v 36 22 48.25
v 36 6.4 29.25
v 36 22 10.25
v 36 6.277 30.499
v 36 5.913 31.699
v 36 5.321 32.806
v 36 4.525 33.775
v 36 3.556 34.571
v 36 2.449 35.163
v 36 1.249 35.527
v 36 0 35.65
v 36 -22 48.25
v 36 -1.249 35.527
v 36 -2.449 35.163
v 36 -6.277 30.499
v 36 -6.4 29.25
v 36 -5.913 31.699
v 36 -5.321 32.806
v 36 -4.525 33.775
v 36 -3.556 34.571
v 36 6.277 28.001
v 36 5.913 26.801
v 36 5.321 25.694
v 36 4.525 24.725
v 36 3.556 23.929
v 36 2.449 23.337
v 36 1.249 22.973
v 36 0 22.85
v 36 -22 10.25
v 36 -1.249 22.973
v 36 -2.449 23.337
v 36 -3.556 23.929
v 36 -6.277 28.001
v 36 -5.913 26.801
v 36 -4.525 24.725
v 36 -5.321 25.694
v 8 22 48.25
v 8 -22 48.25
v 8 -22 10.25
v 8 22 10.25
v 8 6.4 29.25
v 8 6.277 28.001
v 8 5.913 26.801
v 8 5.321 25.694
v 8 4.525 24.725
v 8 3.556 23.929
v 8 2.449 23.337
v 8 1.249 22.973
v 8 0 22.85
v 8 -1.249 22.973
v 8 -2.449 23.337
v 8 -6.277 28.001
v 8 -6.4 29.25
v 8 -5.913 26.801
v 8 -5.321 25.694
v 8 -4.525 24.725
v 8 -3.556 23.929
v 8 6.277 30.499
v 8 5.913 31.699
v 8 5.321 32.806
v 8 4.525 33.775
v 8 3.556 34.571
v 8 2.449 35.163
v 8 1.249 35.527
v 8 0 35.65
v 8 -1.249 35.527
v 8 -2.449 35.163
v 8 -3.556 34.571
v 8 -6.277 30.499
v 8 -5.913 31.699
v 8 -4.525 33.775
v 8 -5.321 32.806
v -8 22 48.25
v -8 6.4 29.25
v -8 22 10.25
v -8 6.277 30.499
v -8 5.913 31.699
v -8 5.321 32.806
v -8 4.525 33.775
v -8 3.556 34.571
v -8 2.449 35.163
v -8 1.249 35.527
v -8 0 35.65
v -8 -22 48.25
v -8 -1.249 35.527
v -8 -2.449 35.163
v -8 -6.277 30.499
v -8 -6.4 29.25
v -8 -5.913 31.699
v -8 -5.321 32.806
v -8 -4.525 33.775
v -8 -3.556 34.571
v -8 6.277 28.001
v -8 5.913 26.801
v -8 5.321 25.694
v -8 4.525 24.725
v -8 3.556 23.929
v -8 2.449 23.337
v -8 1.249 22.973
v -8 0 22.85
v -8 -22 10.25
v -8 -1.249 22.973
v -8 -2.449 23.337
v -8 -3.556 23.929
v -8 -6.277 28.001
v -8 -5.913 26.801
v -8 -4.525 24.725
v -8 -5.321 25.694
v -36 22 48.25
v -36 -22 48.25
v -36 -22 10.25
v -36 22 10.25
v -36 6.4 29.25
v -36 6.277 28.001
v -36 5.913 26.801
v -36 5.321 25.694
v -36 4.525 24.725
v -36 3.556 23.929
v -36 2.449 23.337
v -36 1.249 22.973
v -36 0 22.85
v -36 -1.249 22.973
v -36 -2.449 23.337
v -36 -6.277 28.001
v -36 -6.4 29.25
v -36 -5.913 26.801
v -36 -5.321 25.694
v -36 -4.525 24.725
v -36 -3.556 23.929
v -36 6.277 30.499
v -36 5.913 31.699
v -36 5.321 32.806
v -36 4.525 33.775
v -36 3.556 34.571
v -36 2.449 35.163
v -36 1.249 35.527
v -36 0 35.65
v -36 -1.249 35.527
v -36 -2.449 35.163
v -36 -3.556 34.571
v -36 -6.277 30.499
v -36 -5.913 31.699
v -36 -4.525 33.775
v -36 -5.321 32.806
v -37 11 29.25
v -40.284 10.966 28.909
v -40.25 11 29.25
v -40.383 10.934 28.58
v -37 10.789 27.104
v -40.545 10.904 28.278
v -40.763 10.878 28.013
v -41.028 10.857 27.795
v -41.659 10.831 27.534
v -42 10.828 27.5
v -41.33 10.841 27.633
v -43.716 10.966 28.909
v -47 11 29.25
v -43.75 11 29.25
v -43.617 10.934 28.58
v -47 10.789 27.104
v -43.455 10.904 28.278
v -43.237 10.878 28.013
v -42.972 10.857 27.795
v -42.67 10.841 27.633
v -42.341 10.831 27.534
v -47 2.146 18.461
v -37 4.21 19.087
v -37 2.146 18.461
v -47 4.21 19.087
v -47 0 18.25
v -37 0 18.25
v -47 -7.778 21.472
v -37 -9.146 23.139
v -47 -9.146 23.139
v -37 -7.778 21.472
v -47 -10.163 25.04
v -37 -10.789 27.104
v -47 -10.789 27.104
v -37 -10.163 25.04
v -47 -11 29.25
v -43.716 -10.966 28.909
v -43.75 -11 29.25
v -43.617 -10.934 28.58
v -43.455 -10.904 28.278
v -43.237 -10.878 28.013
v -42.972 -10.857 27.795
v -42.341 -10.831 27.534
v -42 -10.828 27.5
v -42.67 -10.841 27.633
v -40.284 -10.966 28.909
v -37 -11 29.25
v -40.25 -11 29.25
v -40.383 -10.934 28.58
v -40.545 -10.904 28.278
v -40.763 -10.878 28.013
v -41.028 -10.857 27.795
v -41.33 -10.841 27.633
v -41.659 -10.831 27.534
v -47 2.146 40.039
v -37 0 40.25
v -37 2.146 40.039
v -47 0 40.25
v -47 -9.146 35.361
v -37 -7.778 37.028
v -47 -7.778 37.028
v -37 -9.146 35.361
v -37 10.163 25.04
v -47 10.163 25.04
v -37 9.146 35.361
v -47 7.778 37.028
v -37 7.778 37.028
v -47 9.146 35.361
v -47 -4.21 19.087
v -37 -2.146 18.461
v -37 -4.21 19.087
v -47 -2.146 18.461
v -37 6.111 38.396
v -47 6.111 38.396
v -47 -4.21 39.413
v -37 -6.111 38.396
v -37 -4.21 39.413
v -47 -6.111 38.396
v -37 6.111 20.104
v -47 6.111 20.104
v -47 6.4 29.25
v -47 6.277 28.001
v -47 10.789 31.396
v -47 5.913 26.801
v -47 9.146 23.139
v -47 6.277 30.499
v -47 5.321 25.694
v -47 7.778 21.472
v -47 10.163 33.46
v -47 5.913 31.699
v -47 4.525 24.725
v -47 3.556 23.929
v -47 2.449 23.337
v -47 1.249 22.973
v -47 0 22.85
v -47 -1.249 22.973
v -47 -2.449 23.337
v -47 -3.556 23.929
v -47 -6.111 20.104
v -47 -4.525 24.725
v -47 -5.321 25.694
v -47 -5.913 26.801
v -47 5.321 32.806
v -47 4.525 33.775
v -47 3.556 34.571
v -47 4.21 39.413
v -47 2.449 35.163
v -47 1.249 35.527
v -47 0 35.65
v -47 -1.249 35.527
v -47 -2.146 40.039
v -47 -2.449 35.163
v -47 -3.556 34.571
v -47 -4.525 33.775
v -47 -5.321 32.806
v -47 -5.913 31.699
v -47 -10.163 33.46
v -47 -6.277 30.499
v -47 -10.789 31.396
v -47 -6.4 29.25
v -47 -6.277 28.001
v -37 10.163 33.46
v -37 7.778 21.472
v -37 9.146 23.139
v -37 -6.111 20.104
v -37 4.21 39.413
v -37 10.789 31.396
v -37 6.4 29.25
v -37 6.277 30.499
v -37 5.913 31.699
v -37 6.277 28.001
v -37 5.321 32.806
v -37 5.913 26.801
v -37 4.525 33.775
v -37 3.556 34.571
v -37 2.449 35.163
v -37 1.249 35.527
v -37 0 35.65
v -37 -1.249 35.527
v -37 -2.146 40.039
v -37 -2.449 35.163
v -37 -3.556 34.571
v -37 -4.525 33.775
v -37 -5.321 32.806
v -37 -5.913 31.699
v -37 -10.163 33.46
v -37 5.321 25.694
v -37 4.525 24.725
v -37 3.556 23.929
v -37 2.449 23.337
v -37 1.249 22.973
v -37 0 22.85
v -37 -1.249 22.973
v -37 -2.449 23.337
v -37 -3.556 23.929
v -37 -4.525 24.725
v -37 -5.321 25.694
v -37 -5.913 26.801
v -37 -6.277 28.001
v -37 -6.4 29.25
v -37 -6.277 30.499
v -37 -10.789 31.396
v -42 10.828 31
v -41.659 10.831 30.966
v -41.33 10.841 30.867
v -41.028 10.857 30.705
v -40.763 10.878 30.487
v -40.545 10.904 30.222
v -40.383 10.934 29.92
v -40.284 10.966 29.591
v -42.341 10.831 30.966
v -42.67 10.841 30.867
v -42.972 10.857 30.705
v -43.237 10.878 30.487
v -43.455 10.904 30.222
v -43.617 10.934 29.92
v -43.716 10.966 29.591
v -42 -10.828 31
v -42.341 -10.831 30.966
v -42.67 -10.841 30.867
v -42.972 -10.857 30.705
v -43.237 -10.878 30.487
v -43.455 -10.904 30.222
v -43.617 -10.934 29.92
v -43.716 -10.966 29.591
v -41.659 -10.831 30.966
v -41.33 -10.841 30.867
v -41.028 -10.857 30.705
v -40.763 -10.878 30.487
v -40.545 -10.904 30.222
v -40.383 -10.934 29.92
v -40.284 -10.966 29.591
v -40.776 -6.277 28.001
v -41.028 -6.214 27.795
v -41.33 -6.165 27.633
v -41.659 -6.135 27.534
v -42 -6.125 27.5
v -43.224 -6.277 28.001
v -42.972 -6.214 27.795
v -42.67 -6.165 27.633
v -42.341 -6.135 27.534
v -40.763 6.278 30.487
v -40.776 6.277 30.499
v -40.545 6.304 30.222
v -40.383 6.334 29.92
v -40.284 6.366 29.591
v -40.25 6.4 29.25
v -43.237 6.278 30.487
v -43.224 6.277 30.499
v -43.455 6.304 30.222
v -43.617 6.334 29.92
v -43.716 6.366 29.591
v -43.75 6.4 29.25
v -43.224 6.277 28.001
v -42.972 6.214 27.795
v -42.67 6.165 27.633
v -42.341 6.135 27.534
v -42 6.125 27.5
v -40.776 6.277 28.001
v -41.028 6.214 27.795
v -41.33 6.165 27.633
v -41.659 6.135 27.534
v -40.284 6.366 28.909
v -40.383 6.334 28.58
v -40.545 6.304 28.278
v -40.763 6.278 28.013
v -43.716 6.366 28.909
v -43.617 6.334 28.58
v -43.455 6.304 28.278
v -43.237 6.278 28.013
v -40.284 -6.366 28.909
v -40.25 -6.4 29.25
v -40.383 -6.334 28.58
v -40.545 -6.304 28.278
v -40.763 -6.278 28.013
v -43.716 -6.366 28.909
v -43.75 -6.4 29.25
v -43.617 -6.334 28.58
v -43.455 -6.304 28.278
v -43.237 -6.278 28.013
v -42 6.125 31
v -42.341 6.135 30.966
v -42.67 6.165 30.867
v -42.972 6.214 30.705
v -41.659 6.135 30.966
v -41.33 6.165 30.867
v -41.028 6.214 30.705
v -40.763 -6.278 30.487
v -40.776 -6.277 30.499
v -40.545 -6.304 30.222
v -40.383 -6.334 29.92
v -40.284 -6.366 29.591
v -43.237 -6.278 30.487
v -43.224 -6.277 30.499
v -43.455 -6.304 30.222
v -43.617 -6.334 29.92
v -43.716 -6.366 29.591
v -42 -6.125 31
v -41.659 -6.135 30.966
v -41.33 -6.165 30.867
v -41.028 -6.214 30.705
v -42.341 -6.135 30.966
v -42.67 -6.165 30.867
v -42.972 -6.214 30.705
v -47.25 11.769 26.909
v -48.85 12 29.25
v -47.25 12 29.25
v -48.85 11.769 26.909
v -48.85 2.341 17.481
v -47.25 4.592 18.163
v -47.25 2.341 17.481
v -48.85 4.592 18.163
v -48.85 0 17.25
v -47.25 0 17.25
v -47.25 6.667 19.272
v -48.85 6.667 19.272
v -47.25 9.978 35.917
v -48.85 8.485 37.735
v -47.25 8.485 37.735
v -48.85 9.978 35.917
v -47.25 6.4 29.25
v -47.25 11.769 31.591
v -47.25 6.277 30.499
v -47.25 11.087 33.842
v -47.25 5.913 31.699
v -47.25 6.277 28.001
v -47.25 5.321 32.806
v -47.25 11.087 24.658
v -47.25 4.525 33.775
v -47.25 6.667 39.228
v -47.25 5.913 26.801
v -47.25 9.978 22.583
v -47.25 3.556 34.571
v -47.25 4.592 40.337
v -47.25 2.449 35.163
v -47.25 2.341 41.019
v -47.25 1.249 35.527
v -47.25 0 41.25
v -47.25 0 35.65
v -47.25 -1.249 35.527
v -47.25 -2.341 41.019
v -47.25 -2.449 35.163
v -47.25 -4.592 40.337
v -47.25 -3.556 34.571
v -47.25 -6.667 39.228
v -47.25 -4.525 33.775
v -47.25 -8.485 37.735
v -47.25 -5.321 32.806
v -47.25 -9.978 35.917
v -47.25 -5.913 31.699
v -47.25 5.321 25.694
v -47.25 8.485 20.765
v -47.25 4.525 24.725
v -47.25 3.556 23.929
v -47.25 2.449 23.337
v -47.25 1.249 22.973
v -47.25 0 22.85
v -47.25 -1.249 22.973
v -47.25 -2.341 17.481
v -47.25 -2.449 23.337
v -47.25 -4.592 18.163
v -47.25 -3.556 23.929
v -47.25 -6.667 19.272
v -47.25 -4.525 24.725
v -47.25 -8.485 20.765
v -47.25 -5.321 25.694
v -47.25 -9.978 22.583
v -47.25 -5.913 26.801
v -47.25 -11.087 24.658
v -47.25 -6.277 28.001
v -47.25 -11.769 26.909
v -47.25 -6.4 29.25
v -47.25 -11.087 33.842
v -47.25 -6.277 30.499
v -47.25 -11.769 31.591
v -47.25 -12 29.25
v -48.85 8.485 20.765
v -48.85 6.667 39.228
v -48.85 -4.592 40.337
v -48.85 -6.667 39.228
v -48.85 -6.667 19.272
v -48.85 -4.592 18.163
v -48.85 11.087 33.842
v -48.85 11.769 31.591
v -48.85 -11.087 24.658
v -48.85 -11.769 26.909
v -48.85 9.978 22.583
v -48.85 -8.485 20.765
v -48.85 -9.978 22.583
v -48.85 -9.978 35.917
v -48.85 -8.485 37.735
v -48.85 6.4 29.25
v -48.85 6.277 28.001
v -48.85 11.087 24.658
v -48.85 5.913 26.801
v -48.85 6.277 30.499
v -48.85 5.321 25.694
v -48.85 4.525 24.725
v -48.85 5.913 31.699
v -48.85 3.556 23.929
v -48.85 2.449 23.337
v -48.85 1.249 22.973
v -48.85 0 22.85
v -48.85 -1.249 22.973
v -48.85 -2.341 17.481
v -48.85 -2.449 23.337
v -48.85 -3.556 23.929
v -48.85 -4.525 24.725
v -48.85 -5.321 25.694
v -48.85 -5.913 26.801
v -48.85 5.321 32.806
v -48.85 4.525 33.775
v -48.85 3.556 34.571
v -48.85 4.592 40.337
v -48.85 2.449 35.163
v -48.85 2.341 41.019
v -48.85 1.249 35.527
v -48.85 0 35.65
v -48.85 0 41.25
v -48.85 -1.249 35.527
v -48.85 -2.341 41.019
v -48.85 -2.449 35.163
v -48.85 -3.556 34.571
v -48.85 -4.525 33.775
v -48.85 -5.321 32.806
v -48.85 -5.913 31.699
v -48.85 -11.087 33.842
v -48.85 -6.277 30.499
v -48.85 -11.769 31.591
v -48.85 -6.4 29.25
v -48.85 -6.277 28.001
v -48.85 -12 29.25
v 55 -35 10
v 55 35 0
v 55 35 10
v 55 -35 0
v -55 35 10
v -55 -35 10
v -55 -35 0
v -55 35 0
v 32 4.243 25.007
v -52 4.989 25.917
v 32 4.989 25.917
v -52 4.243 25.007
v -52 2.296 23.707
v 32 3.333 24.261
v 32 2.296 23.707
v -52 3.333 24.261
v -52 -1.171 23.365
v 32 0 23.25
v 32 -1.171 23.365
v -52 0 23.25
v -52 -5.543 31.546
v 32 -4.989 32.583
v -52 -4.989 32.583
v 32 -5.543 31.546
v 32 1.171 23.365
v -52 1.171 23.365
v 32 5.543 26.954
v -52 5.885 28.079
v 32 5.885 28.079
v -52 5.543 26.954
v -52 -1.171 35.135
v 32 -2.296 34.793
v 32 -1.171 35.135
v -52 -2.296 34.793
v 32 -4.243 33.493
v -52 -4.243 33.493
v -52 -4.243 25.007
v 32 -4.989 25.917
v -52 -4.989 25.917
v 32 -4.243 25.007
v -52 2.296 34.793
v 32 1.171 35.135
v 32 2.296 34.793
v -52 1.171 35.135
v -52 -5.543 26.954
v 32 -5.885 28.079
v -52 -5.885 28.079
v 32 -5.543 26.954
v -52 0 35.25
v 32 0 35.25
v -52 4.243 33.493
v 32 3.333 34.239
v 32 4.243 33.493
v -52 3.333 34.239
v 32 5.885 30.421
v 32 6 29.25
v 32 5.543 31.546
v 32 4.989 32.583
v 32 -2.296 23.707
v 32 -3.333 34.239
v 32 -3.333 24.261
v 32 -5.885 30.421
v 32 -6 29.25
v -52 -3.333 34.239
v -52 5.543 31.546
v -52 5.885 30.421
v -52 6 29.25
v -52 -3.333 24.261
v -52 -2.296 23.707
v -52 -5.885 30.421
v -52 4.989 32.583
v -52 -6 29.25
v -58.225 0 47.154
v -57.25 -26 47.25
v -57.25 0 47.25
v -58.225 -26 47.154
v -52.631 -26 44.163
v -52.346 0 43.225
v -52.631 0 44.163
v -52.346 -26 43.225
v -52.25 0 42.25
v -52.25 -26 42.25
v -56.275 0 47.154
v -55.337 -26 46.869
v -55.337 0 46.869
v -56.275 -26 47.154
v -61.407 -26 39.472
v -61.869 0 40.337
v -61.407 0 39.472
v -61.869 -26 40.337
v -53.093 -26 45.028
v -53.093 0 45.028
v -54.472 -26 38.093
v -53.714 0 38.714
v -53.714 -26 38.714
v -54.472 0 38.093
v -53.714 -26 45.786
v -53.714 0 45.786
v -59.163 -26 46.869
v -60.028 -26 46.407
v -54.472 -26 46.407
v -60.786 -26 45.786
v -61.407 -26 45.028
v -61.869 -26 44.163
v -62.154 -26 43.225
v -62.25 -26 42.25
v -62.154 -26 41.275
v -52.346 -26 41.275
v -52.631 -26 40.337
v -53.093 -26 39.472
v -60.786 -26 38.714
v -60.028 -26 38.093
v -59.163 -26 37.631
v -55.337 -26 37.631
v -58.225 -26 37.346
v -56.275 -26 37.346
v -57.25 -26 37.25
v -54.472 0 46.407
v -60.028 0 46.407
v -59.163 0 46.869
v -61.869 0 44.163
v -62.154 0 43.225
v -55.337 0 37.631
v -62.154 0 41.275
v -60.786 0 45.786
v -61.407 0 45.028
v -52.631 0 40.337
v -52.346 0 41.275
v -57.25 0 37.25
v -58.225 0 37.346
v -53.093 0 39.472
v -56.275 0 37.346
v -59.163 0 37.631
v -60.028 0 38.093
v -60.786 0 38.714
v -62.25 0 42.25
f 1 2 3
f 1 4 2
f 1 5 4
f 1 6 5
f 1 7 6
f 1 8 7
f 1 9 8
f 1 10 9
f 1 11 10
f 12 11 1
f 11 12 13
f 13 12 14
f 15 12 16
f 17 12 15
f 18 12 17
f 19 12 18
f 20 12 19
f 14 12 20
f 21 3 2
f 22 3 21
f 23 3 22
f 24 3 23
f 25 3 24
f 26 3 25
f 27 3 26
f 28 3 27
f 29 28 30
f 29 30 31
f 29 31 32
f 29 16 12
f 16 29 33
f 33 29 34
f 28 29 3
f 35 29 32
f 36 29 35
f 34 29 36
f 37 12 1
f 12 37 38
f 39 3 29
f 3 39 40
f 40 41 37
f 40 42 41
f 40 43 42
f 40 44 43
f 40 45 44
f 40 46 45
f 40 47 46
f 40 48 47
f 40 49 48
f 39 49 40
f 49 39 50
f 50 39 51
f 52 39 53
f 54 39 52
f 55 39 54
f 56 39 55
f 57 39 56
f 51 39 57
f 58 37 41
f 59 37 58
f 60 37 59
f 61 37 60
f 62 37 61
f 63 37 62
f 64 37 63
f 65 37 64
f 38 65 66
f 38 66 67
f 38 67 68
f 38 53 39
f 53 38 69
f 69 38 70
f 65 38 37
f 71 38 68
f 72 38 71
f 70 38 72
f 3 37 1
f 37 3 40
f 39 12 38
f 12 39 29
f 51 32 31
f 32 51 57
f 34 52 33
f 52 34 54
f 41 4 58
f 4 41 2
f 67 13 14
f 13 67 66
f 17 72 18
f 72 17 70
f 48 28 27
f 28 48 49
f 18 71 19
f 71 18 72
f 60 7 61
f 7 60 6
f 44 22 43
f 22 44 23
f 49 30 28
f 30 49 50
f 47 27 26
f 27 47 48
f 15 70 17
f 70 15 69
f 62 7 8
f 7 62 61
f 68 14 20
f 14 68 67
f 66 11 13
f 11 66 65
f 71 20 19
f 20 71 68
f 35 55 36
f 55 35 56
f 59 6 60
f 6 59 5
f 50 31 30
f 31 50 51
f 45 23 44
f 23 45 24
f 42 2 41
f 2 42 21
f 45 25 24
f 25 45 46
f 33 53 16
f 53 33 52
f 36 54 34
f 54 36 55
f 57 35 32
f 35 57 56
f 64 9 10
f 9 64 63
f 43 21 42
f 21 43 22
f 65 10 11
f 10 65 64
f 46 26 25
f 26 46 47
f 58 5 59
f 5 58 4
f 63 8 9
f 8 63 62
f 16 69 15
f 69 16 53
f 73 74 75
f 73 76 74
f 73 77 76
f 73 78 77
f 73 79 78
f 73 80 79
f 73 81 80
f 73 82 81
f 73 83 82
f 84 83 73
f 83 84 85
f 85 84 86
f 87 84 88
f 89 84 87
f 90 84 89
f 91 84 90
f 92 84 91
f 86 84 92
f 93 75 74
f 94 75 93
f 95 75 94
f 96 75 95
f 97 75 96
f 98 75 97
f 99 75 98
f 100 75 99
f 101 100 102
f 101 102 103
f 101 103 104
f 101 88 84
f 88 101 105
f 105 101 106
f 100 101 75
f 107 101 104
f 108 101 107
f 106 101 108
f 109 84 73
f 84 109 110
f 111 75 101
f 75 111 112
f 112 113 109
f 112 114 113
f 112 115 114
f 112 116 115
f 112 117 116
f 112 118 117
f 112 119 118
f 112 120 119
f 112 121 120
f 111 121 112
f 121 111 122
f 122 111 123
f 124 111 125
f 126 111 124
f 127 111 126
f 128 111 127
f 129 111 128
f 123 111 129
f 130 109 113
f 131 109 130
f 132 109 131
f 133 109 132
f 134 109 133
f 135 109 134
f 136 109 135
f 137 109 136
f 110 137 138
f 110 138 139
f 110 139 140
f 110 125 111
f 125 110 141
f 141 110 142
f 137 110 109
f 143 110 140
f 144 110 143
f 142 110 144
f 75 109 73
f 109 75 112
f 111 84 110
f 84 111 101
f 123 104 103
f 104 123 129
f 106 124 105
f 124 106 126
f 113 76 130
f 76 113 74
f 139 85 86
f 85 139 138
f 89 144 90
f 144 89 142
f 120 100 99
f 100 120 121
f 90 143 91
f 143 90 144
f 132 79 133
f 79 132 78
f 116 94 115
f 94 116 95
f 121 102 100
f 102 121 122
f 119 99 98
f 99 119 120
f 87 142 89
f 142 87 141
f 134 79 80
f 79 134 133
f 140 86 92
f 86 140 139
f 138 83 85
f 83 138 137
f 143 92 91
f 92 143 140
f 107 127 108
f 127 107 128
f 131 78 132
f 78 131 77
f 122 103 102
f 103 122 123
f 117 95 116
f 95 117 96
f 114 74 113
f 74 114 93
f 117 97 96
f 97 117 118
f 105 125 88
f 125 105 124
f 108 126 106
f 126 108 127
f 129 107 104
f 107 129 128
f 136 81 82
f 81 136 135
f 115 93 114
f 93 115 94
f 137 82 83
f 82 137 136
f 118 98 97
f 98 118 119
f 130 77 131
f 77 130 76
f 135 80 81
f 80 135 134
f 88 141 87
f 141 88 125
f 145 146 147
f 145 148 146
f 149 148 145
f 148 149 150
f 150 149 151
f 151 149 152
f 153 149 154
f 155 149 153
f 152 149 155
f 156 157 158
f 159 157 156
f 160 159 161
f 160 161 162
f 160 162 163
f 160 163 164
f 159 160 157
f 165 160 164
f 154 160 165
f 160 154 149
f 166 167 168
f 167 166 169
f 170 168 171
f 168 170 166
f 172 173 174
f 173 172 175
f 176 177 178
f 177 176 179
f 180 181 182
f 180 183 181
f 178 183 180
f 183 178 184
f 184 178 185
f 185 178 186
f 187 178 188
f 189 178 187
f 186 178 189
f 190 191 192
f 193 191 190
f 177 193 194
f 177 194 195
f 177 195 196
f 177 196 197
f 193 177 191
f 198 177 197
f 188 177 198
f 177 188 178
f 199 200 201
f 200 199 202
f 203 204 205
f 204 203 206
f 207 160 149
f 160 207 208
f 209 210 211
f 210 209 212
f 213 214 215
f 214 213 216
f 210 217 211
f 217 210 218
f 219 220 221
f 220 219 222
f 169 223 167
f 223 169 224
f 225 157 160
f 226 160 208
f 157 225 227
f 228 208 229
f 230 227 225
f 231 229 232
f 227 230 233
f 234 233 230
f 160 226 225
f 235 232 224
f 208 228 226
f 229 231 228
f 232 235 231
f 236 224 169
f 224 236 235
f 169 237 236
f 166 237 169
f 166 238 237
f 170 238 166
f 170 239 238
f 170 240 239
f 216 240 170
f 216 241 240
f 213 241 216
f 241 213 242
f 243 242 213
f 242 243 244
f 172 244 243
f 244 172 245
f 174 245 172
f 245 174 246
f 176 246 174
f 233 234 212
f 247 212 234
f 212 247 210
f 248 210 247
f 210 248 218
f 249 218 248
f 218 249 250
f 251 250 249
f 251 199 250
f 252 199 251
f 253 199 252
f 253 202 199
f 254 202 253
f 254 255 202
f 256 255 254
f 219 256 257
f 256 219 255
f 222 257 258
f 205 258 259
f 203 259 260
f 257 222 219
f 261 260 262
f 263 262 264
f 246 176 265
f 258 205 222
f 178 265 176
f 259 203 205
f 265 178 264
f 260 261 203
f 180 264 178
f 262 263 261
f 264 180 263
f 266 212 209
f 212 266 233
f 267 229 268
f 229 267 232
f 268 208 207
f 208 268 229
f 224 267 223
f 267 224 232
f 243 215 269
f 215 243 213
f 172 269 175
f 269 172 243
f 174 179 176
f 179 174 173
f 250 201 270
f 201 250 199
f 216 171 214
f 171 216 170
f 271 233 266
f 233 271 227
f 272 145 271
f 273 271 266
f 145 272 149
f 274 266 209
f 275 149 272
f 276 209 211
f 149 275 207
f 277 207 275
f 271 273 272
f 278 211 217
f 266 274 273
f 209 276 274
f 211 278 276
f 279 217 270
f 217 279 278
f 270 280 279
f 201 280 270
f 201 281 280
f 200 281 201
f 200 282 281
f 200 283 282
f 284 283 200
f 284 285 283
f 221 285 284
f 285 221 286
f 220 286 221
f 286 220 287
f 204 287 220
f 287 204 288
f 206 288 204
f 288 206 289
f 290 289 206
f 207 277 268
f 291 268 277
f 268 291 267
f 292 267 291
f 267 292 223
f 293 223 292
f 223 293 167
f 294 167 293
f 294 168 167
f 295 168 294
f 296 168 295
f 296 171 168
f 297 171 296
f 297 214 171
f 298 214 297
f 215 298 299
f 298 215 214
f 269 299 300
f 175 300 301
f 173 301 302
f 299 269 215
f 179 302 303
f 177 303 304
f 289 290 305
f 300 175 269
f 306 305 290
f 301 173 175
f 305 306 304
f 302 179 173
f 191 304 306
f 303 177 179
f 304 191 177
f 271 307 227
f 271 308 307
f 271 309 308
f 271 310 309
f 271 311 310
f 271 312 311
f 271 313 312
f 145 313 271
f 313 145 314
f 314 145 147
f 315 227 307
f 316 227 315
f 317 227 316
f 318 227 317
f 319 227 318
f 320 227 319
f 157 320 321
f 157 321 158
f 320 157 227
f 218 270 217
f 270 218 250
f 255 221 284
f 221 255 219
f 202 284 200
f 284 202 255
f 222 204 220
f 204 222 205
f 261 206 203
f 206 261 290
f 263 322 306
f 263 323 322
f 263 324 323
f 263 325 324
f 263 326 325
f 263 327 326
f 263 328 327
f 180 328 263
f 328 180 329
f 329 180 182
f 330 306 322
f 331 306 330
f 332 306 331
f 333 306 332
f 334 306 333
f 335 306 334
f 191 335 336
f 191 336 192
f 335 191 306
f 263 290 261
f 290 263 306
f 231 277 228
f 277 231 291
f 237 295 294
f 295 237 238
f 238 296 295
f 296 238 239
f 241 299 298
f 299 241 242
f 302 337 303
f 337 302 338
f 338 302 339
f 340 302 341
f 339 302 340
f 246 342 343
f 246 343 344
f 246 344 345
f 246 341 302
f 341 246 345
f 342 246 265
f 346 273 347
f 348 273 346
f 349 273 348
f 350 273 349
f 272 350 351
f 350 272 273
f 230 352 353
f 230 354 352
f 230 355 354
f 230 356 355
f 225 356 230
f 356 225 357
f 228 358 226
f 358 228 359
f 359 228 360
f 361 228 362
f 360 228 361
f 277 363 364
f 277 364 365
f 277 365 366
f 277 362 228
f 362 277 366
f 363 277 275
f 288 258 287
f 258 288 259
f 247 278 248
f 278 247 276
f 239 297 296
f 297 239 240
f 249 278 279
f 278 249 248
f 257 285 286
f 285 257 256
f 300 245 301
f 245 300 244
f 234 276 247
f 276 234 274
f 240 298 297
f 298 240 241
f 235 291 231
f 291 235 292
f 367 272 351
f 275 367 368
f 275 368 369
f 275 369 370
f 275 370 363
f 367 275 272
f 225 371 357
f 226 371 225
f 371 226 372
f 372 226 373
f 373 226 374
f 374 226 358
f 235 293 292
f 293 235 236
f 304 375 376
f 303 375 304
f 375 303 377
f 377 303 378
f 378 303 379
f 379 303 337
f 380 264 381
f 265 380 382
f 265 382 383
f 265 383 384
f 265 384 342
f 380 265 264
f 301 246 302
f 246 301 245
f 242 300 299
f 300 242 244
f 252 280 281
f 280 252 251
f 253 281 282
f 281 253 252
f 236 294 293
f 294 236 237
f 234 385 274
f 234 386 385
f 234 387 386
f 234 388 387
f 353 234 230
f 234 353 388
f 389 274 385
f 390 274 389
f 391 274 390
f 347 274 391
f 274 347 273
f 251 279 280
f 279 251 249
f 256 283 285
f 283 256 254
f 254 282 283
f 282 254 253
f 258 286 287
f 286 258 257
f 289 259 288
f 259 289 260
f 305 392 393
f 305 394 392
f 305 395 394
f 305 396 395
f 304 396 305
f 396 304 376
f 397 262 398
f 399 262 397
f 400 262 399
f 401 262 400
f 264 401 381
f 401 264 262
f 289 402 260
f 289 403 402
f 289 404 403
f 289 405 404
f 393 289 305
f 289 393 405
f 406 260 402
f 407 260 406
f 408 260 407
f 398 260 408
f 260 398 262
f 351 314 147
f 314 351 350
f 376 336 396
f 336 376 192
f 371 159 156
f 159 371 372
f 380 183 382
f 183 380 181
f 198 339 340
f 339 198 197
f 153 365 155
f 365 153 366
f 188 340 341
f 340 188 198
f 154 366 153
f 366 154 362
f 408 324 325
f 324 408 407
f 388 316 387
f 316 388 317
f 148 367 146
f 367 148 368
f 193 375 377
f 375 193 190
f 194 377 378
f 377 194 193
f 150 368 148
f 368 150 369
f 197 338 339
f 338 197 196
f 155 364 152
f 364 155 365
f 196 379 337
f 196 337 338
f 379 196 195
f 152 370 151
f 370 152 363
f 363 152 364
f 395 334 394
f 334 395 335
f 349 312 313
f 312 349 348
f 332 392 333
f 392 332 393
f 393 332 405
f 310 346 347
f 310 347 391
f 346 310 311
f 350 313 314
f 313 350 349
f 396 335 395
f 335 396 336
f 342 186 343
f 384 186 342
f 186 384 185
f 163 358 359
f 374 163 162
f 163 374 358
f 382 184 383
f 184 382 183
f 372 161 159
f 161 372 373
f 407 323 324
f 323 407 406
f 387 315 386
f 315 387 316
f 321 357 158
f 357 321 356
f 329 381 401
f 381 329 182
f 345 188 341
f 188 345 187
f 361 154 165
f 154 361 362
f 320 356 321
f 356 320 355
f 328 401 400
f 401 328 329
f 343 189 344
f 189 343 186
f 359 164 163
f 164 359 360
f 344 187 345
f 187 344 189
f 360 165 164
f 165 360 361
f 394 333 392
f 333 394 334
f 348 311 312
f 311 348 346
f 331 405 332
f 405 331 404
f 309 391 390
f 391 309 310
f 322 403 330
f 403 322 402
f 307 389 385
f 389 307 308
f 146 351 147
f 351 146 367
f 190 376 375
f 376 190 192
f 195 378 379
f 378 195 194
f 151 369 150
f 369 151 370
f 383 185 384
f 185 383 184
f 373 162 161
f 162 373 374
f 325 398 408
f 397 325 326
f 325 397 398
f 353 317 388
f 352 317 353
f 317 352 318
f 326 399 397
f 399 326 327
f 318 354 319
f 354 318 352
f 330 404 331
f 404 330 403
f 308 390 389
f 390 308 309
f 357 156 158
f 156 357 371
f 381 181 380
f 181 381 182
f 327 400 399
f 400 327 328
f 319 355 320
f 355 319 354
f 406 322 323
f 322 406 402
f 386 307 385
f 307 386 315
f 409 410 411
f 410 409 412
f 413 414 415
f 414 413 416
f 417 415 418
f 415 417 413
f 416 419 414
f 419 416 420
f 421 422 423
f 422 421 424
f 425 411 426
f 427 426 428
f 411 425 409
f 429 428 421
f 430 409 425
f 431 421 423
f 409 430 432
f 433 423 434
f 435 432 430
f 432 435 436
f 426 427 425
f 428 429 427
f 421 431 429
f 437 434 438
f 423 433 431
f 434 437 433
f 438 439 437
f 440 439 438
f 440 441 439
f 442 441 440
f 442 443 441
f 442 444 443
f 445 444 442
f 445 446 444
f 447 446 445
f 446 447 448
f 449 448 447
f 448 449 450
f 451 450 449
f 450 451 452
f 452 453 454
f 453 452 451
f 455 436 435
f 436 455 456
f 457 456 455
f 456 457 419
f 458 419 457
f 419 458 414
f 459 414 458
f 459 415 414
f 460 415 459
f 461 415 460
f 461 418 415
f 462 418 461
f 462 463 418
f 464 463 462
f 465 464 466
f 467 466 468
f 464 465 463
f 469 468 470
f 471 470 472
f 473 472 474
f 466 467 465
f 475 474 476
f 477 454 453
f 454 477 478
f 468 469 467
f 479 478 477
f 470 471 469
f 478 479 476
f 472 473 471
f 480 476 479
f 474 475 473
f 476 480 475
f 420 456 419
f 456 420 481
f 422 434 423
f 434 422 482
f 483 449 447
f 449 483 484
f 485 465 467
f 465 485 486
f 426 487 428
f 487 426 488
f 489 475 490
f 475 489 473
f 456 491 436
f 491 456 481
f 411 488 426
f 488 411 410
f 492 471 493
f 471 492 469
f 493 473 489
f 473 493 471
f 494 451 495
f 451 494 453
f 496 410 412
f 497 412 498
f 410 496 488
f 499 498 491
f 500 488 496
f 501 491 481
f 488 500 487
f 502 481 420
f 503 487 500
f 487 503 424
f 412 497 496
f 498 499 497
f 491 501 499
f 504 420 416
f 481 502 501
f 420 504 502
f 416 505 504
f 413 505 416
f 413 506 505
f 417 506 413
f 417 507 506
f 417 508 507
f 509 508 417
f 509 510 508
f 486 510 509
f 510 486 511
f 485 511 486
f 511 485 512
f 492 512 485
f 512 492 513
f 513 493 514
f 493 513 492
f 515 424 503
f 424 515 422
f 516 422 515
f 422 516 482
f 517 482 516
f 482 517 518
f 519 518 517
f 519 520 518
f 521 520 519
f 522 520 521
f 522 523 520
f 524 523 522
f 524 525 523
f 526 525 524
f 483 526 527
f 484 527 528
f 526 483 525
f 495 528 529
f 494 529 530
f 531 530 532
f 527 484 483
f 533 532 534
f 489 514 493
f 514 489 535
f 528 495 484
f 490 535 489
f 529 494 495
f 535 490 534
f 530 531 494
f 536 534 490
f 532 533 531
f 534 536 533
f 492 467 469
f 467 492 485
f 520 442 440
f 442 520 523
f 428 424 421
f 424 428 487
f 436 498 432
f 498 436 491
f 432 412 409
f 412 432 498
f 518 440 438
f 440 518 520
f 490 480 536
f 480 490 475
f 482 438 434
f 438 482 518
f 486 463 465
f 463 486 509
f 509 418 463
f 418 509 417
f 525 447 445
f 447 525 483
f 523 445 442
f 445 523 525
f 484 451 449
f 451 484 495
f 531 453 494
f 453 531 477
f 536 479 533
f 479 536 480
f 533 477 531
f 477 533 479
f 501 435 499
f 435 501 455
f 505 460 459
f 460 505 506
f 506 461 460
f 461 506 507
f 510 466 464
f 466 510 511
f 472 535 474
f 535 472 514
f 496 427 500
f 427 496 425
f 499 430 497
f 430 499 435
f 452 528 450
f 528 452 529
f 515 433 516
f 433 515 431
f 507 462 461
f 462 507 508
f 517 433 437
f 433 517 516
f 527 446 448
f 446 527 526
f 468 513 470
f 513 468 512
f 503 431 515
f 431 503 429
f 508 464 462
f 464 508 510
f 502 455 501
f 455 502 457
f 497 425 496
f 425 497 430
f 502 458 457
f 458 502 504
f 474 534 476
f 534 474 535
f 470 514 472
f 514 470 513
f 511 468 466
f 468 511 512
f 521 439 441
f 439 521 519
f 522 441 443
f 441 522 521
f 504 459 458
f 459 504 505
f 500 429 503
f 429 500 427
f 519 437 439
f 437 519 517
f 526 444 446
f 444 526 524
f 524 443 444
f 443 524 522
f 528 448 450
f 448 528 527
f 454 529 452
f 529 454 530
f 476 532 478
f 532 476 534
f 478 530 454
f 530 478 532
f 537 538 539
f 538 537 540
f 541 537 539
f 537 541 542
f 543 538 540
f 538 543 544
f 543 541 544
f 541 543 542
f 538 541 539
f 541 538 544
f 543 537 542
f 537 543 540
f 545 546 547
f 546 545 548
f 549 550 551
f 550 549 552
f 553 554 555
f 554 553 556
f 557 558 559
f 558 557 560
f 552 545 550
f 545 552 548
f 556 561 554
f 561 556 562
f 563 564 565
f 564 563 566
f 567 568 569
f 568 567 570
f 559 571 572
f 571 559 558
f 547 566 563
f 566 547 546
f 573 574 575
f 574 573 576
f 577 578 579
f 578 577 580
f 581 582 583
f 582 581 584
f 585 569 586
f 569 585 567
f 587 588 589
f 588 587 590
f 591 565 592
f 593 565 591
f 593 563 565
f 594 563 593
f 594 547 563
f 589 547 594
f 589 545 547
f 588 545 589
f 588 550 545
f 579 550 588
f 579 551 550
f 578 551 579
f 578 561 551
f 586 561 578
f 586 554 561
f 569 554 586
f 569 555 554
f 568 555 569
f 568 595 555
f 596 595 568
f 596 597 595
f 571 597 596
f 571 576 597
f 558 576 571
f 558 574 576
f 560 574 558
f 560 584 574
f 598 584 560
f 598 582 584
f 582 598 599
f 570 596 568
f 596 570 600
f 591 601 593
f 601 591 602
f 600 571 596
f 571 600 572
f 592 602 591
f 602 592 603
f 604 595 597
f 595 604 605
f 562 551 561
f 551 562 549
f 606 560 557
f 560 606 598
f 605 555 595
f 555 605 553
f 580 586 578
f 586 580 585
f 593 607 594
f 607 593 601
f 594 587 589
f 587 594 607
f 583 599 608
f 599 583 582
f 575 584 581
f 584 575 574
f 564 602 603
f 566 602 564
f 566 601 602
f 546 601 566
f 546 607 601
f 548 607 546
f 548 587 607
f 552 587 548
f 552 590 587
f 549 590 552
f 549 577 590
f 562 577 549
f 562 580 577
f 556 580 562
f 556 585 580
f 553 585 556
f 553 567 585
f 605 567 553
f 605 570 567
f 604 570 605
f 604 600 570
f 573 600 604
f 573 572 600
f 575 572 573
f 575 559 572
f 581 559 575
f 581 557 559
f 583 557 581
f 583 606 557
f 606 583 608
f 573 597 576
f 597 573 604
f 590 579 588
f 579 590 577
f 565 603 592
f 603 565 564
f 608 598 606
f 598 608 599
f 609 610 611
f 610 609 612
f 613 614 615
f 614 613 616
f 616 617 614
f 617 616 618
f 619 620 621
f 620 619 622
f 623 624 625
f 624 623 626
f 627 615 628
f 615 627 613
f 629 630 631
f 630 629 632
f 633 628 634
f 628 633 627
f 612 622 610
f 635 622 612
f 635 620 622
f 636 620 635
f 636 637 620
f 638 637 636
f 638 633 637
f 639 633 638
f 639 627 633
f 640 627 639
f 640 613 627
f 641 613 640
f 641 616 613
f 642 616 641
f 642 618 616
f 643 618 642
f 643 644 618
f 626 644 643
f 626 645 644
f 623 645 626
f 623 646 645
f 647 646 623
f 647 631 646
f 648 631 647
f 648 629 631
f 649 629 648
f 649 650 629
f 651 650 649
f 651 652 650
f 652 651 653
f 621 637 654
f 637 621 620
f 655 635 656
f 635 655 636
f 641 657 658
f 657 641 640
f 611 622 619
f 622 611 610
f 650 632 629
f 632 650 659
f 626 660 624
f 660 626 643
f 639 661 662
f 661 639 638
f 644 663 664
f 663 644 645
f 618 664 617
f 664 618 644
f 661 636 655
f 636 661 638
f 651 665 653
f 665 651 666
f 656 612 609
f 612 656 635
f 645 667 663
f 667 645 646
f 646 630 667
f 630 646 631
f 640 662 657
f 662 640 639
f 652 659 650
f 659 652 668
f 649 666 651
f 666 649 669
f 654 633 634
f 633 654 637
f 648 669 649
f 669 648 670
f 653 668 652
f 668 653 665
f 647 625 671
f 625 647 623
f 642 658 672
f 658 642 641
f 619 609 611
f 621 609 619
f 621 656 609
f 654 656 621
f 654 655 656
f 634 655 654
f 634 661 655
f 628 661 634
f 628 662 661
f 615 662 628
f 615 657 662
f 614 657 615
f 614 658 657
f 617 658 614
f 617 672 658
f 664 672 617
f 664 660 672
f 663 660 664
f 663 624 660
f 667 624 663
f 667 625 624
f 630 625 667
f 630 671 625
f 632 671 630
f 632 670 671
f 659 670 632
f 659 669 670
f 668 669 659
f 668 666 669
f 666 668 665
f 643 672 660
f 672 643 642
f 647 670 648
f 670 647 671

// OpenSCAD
$fn = 32;

// ------------------------------------------------------------------------
// Machine vise: screw d12, jaws 28 x 38 mm
// Every part is its own module, assembly() places every instance.
// ------------------------------------------------------------------------

// --- part 1 ---
module vise_bed() {
  difference() {
    translate([-55, -35, 0]) cube([110, 70, 10]);
  }
}

// --- part 2 ---
module vise_jaw() {
  difference() {
    translate([-14, -22, 0]) cube([28, 44, 38]);
    translate([0, 0, 19]) rotate([0, 90, 0]) cylinder(h = 30, d = 12.8, center = true);
  }
}

// --- part 3 ---
module vise_screw() {
  translate([0, 0, -42]) cylinder(h = 84, d = 12);
}

// --- part 4 ---
module screw_collar() {
  difference() {
    cylinder(h = 10, d = 22);
    translate([0, 0, -1]) cylinder(h = 12, d = 12.8);
    translate([0, 0, 5]) rotate([90, 0, 0]) cylinder(h = 24, d = 3.5, center = true);
  }
}

// --- part 5 ---
module screw_washer() {
  difference() {
      translate([0, 0, 0]) cylinder(h = 1.6, d = 24);
      translate([0, 0, -1]) cylinder(h = 3.6, d = 12.8);
    }
}

// --- part 6 ---
module vise_handle() {
  cylinder(h = 26, d = 10);
}

// --- assembly ---
module assembly() {
  color([0.80, 0.24, 0.20]) translate([0, 0, 0]) rotate([0, 0, 0]) vise_bed();
  color([0.20, 0.45, 0.75]) translate([22, 0, 10.25]) rotate([0, 0, 0]) vise_jaw();
  color([0.25, 0.62, 0.32]) translate([-22, 0, 10.25]) rotate([0, 0, 0]) vise_jaw();
  color([0.92, 0.70, 0.18]) translate([-10, 0, 29.25]) rotate([0, 90, 0]) vise_screw();
  color([0.58, 0.35, 0.70]) translate([-47, 0, 29.25]) rotate([0, 90, 0]) screw_collar();
  color([0.16, 0.66, 0.66]) translate([-48.85, 0, 29.25]) rotate([0, 90, 0]) screw_washer();
  color([0.85, 0.48, 0.18]) translate([-57.25, 0, 42.25]) rotate([90, 0, 0]) vise_handle();
}

assembly();
